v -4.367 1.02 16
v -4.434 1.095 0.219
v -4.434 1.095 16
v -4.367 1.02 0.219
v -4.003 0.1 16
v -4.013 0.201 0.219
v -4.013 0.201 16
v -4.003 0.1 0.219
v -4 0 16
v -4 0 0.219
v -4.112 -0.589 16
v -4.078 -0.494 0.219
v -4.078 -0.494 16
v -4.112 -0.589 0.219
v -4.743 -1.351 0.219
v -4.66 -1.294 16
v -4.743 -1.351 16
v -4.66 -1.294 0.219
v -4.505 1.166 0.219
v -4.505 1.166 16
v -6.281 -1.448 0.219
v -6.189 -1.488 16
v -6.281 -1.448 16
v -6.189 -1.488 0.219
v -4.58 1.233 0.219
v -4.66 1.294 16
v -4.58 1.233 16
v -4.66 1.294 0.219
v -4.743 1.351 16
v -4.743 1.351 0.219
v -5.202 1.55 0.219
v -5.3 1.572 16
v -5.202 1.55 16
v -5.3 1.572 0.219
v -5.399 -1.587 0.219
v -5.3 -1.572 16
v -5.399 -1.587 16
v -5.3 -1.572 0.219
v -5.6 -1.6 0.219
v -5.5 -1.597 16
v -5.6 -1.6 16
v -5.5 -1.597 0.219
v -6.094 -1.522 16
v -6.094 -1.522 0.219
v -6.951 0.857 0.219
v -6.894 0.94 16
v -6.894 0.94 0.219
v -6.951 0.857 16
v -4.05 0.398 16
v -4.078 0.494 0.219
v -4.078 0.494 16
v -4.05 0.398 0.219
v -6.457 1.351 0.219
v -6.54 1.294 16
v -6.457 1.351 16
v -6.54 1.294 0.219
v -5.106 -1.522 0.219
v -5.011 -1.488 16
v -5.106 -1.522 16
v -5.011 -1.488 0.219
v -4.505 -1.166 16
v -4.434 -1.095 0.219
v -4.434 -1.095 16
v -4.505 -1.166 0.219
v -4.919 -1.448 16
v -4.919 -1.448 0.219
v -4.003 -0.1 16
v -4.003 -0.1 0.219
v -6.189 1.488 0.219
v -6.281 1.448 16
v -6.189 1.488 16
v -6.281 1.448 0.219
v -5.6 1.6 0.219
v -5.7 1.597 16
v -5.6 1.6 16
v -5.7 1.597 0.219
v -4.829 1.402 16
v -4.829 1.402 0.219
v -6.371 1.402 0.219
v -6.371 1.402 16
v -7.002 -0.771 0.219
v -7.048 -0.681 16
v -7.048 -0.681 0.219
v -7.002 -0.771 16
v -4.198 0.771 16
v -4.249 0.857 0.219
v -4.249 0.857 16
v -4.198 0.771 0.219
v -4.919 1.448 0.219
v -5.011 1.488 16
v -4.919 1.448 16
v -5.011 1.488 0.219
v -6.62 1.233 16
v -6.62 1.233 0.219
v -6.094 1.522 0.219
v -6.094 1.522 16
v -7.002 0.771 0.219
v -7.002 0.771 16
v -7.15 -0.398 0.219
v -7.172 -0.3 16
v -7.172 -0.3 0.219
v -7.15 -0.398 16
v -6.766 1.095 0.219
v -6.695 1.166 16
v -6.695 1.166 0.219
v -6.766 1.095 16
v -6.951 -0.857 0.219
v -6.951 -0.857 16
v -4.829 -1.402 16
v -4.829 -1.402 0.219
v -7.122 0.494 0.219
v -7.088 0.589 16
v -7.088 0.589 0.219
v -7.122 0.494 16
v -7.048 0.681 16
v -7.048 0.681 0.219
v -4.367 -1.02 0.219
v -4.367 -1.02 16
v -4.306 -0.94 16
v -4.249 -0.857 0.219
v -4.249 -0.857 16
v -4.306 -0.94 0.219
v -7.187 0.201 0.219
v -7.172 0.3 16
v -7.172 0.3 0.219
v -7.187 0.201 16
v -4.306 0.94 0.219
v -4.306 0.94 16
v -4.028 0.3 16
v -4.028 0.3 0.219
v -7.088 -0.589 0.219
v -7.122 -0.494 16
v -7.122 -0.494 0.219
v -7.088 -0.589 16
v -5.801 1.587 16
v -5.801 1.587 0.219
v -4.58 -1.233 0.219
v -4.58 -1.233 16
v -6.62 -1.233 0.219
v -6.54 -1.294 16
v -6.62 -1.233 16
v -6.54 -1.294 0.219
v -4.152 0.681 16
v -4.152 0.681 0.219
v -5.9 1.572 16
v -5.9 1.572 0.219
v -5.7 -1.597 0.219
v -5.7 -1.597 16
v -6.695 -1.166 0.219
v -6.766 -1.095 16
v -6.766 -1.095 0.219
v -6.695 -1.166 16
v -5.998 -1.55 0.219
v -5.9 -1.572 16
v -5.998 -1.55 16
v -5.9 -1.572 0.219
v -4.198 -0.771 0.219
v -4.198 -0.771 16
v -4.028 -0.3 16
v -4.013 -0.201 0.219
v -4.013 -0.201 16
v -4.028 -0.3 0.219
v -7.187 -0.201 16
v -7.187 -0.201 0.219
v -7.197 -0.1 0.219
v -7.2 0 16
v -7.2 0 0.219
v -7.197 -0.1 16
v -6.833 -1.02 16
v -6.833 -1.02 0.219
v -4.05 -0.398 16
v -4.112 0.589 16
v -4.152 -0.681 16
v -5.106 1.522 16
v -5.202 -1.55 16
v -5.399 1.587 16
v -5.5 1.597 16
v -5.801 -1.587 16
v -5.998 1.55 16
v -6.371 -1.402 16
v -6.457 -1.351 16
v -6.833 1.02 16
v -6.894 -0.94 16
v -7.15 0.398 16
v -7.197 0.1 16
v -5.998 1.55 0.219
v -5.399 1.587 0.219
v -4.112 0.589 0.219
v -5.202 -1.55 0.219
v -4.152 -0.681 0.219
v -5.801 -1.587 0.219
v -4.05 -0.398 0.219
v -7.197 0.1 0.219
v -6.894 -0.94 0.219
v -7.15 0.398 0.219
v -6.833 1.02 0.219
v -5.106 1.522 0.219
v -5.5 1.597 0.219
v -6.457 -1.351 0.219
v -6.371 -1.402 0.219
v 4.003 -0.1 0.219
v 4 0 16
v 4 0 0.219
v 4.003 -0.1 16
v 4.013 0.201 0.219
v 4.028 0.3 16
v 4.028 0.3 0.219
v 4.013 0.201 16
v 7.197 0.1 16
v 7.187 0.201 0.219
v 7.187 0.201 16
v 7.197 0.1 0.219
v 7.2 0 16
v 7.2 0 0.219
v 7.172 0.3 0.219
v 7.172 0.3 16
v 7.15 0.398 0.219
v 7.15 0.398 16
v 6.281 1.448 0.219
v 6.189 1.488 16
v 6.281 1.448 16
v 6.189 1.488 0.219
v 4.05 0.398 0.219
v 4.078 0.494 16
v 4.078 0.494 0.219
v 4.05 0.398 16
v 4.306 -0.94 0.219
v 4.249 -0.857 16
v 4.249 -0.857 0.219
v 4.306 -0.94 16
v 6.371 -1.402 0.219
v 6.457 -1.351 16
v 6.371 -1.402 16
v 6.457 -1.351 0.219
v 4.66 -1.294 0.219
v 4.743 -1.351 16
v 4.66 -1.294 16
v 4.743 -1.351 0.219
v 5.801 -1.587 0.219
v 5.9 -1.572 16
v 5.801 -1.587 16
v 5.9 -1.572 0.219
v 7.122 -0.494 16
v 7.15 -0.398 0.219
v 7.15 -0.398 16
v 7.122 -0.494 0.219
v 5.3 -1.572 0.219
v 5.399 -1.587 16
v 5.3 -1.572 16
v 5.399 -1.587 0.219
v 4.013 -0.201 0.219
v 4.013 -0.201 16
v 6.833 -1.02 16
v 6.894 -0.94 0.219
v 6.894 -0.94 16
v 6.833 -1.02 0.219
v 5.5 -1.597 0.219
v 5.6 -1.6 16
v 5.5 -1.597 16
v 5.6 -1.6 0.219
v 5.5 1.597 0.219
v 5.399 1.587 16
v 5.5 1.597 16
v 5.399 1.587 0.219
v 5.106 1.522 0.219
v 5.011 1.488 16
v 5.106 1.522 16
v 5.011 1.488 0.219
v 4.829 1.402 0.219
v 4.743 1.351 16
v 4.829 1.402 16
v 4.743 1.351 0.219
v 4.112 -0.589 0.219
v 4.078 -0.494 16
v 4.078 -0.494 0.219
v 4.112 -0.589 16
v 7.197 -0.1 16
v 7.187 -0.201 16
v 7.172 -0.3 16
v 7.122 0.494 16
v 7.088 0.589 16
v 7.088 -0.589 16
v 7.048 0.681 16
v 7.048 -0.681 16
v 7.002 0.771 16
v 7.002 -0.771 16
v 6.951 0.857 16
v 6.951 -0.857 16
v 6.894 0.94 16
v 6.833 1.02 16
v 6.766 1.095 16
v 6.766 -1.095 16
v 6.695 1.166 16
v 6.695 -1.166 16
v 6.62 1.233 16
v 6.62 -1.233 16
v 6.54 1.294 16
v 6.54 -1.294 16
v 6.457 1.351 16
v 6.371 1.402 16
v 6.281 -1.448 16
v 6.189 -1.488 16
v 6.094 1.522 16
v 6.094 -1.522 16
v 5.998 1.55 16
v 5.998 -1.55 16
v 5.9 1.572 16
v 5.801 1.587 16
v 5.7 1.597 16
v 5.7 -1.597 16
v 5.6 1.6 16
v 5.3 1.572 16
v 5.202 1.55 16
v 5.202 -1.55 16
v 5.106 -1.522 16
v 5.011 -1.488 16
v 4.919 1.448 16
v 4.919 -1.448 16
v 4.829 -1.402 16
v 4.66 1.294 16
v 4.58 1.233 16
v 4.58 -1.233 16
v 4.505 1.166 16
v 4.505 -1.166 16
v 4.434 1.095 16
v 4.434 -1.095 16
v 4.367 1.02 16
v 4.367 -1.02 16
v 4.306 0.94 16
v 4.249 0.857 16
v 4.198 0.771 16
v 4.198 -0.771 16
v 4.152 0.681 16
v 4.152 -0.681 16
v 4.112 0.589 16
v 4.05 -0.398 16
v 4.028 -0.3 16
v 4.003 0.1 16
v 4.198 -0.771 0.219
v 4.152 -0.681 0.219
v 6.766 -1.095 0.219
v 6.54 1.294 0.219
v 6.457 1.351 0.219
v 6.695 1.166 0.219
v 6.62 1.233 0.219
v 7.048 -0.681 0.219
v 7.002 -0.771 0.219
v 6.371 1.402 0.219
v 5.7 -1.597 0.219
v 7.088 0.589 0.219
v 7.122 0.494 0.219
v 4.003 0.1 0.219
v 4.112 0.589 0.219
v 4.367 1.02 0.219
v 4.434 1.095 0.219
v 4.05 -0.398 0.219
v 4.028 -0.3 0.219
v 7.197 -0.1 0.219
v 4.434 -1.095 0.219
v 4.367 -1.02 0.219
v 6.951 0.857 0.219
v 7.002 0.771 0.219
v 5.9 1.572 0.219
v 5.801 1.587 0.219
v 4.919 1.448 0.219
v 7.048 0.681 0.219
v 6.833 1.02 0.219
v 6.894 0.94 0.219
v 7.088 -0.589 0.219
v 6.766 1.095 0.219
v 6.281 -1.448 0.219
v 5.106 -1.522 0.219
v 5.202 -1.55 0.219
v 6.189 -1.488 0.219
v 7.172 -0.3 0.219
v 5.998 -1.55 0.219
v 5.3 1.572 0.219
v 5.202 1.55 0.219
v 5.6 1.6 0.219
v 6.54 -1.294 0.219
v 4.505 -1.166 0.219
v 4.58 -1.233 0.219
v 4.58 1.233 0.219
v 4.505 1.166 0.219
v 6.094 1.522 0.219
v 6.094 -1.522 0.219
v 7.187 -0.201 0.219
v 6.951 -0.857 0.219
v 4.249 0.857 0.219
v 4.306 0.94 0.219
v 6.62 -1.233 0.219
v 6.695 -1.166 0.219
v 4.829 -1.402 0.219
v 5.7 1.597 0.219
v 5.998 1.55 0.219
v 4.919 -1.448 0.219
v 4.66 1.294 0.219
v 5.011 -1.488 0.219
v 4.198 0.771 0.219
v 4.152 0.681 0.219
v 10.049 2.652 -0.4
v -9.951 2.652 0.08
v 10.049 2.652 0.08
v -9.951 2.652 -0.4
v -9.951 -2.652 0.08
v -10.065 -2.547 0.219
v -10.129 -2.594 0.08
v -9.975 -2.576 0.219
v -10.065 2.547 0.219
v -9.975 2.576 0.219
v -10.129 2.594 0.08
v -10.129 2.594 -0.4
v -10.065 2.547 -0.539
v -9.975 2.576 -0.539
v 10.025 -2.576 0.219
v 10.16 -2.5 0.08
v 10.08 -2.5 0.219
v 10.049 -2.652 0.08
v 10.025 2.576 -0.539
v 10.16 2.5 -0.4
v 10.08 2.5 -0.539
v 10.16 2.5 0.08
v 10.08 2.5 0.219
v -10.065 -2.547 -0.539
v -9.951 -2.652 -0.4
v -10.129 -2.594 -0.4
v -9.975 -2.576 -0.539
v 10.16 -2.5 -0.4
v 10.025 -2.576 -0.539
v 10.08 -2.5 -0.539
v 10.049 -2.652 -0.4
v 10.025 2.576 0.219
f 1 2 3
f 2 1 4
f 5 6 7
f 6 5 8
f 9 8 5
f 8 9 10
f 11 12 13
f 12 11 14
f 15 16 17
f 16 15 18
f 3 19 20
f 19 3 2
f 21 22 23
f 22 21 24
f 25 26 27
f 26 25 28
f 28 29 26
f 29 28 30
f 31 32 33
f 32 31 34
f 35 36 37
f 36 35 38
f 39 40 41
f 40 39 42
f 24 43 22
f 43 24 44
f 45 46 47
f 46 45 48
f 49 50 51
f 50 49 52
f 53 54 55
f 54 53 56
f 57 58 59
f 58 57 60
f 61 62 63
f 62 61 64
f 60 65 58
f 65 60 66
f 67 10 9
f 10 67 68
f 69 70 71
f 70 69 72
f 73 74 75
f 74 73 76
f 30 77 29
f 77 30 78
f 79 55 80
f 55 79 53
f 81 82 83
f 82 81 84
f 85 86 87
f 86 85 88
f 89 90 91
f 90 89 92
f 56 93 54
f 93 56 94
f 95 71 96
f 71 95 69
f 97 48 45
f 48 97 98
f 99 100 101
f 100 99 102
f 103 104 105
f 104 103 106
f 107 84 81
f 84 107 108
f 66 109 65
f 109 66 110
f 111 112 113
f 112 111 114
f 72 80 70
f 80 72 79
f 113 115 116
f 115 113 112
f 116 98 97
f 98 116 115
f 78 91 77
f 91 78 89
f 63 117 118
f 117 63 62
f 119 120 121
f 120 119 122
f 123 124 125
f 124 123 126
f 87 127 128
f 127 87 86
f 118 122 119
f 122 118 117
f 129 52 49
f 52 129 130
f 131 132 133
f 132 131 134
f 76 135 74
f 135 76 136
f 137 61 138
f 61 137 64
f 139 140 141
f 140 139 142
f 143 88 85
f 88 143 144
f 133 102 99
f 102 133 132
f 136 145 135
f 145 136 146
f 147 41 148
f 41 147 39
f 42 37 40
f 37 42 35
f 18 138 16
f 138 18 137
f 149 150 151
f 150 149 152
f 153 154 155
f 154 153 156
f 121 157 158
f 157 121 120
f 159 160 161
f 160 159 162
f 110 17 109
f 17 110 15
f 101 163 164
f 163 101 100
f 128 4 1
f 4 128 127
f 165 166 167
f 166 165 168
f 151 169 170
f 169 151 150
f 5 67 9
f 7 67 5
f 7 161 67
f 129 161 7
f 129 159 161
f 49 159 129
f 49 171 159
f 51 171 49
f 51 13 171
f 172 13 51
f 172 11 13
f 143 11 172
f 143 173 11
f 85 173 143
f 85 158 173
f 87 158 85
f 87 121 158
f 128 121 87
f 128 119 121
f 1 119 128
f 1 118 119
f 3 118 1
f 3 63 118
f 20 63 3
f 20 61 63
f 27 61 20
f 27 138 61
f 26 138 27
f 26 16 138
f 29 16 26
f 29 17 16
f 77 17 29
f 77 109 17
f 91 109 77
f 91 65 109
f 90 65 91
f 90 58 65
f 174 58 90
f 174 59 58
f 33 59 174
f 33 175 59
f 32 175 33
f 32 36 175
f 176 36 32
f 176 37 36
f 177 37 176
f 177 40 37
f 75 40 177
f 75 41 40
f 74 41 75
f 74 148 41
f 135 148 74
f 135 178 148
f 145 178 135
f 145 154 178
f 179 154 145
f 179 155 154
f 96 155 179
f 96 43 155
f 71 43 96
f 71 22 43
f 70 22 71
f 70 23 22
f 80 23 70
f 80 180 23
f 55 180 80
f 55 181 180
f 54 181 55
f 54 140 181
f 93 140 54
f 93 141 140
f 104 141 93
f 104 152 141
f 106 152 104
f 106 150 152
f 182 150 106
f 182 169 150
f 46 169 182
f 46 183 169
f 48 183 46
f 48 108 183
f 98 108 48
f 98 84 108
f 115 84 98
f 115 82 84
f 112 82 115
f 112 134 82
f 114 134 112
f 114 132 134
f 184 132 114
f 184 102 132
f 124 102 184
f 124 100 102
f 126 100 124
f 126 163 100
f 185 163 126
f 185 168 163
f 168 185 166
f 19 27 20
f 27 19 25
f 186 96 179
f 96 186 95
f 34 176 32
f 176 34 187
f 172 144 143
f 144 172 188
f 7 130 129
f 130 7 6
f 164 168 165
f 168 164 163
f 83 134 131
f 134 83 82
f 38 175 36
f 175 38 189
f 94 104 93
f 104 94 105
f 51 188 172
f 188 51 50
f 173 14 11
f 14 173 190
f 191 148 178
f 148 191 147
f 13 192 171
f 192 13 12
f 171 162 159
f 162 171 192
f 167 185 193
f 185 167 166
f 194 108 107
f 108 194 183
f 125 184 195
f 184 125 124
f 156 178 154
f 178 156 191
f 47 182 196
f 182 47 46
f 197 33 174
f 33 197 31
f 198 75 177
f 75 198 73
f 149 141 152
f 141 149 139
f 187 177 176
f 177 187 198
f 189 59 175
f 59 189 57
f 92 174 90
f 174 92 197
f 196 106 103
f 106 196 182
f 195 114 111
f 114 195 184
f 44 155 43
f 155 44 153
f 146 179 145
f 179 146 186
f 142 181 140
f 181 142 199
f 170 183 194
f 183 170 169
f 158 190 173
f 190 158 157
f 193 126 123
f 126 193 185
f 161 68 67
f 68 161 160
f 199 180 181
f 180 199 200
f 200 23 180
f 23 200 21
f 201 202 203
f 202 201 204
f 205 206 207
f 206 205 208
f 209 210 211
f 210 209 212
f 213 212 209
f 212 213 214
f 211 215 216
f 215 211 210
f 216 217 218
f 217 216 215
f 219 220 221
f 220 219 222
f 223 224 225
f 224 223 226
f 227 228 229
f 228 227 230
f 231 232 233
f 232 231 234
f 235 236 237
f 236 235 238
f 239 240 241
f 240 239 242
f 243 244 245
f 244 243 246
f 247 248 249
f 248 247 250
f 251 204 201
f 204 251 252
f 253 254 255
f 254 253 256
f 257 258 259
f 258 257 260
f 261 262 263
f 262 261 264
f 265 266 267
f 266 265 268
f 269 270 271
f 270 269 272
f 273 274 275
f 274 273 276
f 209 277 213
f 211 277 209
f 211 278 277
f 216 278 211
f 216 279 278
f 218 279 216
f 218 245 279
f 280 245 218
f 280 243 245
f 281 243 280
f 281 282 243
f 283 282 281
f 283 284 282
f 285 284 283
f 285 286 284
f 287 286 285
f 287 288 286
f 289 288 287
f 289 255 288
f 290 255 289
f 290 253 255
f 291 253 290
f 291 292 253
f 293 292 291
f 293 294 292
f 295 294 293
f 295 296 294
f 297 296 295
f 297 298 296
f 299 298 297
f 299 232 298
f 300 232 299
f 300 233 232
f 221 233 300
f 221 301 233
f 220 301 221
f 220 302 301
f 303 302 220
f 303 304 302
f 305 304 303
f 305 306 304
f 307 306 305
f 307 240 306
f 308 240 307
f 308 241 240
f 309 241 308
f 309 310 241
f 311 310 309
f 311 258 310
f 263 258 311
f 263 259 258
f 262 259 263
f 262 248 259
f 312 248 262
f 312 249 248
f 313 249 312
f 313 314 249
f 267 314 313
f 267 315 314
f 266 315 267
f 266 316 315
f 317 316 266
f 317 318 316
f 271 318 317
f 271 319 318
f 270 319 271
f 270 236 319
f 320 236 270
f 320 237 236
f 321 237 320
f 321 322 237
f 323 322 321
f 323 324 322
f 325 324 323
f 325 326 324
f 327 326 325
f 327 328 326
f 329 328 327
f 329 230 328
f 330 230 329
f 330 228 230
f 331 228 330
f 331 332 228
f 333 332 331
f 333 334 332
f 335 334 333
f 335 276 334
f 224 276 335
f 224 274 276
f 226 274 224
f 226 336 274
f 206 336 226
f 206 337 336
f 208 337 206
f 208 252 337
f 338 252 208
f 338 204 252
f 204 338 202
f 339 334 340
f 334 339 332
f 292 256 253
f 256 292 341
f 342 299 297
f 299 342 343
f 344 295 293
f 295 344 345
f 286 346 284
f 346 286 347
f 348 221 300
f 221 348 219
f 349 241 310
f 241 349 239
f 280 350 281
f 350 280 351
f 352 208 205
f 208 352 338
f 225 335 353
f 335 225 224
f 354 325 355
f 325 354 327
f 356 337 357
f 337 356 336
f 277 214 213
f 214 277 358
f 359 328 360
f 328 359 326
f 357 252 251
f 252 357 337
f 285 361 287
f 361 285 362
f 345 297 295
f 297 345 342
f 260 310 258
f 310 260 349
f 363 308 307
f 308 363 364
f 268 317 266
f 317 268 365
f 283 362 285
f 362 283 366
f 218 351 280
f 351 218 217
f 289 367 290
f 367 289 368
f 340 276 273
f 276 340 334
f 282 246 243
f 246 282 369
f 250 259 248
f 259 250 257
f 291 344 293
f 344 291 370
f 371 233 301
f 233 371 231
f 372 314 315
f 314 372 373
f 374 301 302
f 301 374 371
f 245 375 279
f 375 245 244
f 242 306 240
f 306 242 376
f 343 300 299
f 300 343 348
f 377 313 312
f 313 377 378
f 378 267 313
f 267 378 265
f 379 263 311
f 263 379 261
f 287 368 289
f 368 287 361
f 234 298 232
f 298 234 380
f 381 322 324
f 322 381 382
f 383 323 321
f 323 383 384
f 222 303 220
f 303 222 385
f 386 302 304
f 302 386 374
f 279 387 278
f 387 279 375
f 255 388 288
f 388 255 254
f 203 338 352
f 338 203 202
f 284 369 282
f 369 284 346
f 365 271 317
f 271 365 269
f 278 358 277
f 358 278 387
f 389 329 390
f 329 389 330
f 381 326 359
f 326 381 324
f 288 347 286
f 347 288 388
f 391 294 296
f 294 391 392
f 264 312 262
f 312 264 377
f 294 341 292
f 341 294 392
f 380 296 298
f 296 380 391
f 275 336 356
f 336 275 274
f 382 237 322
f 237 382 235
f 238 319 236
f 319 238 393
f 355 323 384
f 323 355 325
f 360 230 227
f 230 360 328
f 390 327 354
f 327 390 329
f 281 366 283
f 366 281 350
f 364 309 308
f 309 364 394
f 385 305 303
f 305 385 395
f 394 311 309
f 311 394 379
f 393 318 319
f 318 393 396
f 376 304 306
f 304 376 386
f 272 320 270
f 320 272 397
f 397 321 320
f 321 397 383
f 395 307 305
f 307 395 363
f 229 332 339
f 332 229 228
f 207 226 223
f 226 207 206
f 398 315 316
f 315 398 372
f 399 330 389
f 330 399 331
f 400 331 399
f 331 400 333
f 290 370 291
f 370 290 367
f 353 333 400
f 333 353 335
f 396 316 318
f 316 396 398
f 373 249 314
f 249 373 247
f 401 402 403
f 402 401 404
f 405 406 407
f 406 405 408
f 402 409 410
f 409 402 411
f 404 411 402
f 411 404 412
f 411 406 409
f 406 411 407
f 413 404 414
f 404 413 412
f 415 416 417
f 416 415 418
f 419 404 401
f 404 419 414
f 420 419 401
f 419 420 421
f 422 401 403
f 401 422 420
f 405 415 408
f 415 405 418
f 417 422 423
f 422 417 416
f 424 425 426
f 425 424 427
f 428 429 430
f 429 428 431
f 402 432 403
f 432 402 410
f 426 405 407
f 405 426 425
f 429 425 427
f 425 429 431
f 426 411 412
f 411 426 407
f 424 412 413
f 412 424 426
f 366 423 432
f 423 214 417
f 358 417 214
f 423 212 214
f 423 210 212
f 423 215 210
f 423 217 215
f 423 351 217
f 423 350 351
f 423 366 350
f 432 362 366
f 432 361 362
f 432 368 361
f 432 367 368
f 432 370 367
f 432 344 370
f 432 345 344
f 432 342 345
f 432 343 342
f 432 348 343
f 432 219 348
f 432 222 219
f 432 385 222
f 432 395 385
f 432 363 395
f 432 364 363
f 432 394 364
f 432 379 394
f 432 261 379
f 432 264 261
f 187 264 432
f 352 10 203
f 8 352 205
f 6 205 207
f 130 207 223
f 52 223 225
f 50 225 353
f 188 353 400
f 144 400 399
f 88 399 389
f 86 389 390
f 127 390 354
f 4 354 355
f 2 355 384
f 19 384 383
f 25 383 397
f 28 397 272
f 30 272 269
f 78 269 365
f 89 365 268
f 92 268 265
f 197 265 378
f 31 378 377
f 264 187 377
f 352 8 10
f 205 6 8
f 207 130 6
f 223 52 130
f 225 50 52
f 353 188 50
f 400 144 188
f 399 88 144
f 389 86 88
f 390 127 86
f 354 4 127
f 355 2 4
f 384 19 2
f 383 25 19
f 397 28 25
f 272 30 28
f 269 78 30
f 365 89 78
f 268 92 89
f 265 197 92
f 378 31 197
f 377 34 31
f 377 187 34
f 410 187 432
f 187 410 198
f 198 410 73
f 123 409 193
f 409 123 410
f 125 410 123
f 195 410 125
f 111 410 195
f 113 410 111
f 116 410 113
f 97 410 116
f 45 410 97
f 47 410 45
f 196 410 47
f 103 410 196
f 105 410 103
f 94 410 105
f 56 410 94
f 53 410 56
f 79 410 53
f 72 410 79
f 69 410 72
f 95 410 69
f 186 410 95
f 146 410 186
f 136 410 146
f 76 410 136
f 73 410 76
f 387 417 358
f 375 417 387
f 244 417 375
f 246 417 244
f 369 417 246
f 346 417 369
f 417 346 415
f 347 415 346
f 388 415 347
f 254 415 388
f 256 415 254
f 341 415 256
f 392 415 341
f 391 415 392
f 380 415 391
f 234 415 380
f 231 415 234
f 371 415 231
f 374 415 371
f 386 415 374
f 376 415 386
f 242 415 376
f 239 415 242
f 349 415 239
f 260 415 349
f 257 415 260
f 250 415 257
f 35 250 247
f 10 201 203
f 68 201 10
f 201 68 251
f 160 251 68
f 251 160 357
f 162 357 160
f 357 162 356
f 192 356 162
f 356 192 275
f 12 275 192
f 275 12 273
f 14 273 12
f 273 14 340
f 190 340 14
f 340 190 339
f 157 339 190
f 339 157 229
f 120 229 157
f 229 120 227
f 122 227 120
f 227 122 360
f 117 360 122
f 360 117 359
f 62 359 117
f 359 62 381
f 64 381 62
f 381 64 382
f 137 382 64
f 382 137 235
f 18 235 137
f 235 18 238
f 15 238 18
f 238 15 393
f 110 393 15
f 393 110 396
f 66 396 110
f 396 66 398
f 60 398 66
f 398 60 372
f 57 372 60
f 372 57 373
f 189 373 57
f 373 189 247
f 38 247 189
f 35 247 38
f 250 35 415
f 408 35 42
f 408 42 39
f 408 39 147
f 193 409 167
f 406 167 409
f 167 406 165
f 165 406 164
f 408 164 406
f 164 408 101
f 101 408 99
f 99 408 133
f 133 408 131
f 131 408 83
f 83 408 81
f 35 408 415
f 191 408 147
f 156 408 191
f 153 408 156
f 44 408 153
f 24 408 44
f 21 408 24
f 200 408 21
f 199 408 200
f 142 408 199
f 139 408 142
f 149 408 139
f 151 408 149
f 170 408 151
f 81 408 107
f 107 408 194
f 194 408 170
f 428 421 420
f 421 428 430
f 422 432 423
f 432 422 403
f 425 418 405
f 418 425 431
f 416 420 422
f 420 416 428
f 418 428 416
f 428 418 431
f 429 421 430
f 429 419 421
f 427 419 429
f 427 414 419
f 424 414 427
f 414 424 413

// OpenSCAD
//---------------------------
// Test Retract 
//---------------------------
$fn=100;

Hc=0.16; // Hauteur de couche
Line_Width = 0.4; // line Width

cylinder_size = 4*Line_Width;
cylinder_height = 100*Hc;

union() {
  Base();
  Etage();
}

module Base() {
    minkowski() {
    translate([0, 0, -Hc]) cube([20,5,3*Hc], center = true);
    //cylinder(r=1,h=Hc, center = false);
        sphere(Hc,$fn=5);
    }
}

module Etage() {
    difference() {
        union() {
            // First pilar
            translate([-3.5*cylinder_size, 0, 0])  cylinder(cylinder_height,cylinder_size,cylinder_size, center = false);
            
            // Second pilar
            translate([3.5*cylinder_size, 0, 0])  cylinder(cylinder_height,cylinder_size,cylinder_size, center = false);
  
        }
    }
}
